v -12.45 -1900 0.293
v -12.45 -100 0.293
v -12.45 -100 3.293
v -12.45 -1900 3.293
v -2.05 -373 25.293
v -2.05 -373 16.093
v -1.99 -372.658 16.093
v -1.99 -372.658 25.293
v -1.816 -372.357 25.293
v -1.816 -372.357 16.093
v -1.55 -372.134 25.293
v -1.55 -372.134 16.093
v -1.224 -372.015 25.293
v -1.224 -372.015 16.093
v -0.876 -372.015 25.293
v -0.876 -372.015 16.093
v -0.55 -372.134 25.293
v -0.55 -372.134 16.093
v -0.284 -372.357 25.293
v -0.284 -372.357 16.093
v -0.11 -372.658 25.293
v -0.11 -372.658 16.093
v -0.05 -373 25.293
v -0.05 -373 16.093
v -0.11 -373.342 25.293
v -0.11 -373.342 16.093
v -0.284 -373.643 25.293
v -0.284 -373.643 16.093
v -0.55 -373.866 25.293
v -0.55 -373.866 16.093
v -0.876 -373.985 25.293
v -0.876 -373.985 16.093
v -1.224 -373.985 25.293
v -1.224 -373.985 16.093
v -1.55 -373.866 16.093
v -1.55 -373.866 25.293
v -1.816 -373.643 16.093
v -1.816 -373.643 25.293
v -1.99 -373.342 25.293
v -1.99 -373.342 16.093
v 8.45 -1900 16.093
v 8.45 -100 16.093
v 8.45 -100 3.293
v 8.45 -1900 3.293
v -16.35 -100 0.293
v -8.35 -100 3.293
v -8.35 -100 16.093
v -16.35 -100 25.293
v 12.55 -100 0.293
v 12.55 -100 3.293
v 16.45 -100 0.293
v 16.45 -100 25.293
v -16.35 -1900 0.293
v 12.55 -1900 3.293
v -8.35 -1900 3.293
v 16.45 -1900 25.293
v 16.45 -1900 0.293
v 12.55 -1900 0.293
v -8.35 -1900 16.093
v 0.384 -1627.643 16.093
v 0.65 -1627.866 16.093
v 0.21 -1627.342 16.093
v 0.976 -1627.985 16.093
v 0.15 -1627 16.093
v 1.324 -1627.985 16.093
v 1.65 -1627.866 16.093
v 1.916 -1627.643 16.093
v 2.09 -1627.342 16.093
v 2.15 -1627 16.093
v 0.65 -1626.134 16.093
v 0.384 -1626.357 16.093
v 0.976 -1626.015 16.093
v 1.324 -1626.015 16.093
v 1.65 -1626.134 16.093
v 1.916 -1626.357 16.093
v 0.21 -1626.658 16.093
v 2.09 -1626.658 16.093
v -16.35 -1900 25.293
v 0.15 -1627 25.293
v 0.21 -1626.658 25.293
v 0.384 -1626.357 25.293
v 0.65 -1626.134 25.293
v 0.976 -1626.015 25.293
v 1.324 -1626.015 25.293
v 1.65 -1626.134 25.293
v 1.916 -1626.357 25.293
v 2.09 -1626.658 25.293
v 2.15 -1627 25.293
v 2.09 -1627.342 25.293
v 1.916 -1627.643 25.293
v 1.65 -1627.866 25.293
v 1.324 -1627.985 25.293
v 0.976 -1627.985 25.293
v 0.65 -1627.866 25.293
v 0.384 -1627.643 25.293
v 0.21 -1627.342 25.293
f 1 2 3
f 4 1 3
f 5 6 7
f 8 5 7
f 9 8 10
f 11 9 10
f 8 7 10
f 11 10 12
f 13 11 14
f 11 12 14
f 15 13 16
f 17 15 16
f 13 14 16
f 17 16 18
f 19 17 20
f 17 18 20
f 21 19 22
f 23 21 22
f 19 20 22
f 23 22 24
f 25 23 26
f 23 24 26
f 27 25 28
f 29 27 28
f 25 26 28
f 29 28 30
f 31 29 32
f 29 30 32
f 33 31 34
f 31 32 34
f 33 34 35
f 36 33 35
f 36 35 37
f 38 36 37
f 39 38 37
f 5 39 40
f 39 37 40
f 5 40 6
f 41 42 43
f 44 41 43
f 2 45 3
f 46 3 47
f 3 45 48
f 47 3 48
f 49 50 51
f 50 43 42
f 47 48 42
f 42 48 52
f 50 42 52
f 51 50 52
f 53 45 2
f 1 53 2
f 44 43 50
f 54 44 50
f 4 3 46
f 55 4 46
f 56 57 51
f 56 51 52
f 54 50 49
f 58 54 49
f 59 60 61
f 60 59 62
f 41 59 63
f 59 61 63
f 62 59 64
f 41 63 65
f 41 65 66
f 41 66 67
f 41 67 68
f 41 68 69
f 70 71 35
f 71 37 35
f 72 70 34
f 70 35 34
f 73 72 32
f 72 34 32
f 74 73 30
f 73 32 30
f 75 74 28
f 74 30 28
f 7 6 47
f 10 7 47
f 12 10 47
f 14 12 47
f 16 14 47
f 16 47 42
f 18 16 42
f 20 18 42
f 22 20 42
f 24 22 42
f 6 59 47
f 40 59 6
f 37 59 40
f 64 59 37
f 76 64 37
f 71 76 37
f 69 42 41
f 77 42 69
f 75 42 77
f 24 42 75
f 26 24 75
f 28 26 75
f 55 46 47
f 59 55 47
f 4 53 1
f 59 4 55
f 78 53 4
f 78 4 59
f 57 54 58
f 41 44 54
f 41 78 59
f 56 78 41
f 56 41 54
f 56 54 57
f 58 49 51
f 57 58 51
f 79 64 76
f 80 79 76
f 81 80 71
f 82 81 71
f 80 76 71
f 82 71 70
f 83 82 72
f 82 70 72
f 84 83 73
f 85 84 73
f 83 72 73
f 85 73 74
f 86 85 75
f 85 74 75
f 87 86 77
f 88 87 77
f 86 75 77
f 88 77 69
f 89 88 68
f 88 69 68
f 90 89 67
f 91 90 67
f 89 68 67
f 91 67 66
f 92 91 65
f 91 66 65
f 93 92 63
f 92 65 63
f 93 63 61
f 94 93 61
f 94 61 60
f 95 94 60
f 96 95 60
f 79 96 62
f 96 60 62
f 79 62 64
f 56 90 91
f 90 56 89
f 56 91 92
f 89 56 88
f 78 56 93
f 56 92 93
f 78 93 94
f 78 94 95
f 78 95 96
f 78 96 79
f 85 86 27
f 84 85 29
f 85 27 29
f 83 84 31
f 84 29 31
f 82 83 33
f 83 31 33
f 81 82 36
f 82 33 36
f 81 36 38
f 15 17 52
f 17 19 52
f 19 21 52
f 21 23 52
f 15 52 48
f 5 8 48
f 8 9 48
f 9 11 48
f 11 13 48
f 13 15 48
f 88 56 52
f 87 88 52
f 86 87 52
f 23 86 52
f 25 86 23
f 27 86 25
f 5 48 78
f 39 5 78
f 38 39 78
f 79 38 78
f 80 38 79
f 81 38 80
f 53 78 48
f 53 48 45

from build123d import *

# Parameters (mm, degrees)
F0_W     = 3.9
F0_H     = 3
F0_W_2   = 4.1
F0_H_2   = 5.1741511822
F1_DEPTH = 2000
F3_D     = 2
F4_W     = 32.8
F4_H     = 100
F5_DEPTH = 25.0010018114


with BuildPart() as f1:
    # F0 (on Front) → F1 (new body)
    with BuildSketch(Plane.XZ):
        with Locations((14.5, 1.7925839761)):
            Rectangle(F0_W, F0_H)
        Polygon((-16.35, 25.2925857875), (-16.35, 0.2925839761), (-12.45, 0.2925839761), (-12.45, 3.2925839761), (-12.45, 8.4667351583), (-8.35, 8.4667351583), (-8.35, 16.0925839761), (8.45, 16.0925839761), (8.45, 8.4667351583), (12.55, 8.4667351583), (12.55, 3.2925839761), (16.45, 3.2925839761), (16.45, 25.2925857875), align=None)
        with Locations((-10.4, 5.8796595672)):
            Rectangle(F0_W_2, F0_H_2)
        with Locations((10.5, 5.8796595672)):
            Rectangle(F0_W_2, F0_H_2)
    extrude(amount=F1_DEPTH)

    # F3 (through all)
    with Locations(Plane.XY.offset(25.2925857875)):
        with Locations((-1.05, -373), (1.15, -1627)):
            Hole(F3_D / 2)

    # F4 (on face) → F5 (cut, through all)
    with BuildSketch(Plane.XY.offset(25.2925857875)):
        with Locations((0.05, -50)):
            Rectangle(F4_W, F4_H)
        with Locations((0.05, -1950)):
            Rectangle(F4_W, F4_H)
    extrude(amount=-F5_DEPTH, mode=Mode.SUBTRACT)


solid = f1.part
